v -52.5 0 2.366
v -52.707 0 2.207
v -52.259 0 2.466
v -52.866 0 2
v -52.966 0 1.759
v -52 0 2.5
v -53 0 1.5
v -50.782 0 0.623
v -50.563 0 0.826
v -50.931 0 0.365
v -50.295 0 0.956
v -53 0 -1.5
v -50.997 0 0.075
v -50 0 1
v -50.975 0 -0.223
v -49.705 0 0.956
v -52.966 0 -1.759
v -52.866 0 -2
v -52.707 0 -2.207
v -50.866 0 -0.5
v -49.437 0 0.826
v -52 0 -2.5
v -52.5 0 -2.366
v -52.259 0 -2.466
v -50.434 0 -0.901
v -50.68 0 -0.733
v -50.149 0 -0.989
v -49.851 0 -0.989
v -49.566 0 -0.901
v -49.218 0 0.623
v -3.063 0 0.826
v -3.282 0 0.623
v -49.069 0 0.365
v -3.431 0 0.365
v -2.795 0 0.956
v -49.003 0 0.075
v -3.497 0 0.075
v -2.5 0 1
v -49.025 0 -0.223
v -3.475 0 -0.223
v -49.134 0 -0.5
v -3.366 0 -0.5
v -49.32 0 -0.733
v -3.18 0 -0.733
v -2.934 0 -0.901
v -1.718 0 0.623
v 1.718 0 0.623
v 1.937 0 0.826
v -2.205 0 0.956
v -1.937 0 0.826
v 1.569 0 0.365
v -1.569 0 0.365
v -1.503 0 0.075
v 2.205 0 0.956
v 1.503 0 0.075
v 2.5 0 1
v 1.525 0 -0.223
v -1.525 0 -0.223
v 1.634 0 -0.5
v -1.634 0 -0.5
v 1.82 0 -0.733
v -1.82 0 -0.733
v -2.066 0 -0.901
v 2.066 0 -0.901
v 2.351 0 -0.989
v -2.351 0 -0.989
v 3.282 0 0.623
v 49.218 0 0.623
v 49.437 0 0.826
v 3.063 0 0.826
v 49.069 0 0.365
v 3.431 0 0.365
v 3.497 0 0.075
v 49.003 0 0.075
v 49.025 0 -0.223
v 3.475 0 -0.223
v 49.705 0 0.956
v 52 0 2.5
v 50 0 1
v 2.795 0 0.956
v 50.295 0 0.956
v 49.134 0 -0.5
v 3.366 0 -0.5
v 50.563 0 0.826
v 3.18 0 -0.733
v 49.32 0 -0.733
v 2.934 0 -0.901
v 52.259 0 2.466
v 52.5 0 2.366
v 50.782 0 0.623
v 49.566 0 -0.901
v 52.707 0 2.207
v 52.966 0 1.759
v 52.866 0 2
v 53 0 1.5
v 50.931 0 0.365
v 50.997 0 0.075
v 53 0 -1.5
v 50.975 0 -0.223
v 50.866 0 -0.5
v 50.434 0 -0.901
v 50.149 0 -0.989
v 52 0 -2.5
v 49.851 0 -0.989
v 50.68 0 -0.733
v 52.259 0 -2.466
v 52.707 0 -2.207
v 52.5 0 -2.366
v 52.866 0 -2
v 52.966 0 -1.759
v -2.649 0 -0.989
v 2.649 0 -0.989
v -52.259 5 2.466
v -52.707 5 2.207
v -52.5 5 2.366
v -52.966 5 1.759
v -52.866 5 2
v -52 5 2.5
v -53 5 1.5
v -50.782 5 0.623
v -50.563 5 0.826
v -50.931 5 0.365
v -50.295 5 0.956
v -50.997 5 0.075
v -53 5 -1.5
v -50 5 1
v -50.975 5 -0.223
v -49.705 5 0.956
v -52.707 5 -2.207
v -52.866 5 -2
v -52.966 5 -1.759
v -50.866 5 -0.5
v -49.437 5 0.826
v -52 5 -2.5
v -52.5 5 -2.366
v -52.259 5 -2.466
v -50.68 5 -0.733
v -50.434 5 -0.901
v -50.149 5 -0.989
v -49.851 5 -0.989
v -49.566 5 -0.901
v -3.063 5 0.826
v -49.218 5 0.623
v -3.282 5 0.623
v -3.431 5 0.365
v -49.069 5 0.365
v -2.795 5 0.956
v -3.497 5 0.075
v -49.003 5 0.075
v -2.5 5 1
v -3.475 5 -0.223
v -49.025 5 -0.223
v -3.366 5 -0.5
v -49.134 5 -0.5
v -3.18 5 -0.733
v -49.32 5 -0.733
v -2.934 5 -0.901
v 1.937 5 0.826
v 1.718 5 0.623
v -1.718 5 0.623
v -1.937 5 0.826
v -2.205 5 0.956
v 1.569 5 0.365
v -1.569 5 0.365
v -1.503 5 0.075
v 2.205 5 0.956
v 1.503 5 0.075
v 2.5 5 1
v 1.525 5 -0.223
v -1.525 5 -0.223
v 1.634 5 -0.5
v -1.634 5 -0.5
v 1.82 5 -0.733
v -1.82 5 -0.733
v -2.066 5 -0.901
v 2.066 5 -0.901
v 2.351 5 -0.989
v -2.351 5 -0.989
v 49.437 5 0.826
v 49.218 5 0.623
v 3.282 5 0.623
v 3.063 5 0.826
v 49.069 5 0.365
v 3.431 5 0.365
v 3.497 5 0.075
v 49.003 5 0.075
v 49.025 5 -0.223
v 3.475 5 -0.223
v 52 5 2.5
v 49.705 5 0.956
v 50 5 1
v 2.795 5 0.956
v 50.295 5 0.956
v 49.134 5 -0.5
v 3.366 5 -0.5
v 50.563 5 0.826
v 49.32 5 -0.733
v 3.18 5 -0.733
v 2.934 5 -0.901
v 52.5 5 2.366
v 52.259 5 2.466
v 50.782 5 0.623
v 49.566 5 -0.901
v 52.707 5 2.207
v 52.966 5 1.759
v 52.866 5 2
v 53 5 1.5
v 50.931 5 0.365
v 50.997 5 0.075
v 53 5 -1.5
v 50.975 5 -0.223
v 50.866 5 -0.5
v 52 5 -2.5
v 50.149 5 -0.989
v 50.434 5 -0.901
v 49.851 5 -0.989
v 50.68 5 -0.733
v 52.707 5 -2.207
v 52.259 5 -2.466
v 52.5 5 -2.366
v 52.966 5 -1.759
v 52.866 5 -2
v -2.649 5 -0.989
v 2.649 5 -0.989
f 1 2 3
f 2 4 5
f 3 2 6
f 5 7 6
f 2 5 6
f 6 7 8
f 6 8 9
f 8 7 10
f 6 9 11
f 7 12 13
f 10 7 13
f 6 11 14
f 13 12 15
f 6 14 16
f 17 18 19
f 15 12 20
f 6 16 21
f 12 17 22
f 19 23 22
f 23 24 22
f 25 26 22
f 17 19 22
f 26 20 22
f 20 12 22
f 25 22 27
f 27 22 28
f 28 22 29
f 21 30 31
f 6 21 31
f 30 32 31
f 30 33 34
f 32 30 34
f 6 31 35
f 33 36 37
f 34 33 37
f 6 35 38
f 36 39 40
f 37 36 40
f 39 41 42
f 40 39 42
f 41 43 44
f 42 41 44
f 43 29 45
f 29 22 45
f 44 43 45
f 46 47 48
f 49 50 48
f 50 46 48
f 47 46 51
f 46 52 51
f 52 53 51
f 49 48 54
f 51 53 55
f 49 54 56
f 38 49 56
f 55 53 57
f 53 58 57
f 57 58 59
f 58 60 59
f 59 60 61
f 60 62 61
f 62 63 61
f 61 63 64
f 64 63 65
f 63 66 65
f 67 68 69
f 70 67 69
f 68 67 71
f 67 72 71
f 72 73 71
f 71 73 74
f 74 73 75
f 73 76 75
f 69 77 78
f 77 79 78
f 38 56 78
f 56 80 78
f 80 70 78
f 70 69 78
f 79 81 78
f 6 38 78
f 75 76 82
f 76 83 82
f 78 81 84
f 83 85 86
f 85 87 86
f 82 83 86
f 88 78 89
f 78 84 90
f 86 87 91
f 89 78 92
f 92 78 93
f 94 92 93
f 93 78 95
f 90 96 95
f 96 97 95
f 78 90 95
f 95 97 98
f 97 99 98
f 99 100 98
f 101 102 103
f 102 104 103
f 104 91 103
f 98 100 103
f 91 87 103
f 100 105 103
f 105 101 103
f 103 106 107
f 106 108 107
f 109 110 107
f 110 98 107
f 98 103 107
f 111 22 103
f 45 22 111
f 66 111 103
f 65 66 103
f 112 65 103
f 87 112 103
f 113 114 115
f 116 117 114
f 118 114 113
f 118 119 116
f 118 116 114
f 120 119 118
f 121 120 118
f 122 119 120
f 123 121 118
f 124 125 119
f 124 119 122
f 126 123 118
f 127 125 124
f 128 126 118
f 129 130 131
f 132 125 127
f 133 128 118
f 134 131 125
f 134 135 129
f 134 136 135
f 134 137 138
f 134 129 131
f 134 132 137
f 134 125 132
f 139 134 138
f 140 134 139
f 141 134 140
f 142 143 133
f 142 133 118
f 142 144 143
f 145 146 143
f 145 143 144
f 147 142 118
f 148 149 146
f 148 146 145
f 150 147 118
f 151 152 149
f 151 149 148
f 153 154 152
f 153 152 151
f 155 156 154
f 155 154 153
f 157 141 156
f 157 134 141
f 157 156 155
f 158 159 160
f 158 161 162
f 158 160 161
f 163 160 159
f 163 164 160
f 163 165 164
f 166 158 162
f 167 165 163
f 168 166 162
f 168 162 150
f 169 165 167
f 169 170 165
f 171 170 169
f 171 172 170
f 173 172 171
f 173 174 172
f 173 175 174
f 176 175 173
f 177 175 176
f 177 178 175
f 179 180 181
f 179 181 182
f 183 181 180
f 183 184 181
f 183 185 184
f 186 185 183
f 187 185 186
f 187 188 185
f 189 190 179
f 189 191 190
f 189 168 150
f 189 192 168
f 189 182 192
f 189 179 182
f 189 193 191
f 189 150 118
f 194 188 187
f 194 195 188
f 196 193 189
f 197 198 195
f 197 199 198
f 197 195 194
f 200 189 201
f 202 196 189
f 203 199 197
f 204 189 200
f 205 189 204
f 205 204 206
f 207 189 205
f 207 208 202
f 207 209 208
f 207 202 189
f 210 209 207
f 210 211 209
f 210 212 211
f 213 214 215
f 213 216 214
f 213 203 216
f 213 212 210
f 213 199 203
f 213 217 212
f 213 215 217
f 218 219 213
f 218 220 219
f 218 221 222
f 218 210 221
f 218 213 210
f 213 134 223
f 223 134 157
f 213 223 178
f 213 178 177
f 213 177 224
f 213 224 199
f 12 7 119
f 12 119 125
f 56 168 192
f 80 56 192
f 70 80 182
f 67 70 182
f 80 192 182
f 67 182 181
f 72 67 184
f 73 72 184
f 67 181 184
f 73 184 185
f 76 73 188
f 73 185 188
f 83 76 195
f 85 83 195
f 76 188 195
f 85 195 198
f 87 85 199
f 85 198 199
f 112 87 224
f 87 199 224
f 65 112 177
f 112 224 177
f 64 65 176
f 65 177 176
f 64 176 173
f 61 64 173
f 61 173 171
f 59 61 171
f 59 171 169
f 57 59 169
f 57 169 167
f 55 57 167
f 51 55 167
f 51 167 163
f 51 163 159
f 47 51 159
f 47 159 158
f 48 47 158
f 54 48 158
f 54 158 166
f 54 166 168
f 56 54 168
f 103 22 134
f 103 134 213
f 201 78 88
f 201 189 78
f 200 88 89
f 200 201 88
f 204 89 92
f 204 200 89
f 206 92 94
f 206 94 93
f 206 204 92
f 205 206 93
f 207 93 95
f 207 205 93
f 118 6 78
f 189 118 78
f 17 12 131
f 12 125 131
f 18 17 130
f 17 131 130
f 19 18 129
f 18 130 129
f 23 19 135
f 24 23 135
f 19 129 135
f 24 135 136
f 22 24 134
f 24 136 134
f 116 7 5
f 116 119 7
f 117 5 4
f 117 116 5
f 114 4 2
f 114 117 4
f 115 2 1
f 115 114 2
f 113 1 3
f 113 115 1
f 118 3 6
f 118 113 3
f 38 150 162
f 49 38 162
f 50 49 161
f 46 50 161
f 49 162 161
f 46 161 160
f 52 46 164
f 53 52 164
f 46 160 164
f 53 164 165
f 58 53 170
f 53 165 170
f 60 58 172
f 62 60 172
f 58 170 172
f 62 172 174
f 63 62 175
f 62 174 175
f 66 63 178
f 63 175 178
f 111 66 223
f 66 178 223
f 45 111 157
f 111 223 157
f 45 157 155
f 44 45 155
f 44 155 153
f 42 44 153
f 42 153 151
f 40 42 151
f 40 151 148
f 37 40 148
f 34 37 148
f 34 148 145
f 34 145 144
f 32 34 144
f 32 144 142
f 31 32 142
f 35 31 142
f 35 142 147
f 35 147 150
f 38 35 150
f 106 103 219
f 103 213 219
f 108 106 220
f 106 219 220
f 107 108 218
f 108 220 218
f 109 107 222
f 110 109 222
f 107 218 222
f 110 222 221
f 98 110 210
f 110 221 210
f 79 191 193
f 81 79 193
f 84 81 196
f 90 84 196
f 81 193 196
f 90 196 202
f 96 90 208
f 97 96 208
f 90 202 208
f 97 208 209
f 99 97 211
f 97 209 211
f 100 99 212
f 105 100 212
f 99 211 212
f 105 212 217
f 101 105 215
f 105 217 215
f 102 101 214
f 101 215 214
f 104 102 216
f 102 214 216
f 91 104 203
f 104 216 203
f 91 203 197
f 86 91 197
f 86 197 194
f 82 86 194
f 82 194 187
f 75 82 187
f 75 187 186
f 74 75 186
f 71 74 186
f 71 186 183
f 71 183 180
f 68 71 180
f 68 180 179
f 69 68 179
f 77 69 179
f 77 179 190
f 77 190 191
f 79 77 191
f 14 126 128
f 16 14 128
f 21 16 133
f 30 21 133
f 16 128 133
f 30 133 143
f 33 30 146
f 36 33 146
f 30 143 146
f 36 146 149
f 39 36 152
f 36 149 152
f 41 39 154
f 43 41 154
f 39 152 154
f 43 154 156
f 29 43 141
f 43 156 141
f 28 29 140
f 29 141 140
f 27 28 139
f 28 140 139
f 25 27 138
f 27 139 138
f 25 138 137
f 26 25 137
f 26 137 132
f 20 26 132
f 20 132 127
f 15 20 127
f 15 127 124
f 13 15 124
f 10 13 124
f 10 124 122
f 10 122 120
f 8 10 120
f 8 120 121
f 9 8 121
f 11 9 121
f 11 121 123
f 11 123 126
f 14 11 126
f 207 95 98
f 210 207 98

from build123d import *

# Parameters (mm, degrees)
SKETCH1_W           = 106
SKETCH1_H           = 5
BOSS_EXTRUDE1_DEPTH = 5
FILLET1_R           = 1
FILLET2_R           = 1
SKETCH2_R           = 1
CUT_EXTRUDE1_DEPTH  = 54.293995909


with BuildPart() as part:
    # Sketch1 → Boss-Extrude1 (new body)
    with BuildSketch(Plane(origin=(0, 0, 0), x_dir=(1, 0, 0), z_dir=(0, 1, 0))):
        Rectangle(SKETCH1_W, SKETCH1_H)
    extrude(amount=BOSS_EXTRUDE1_DEPTH)

    # Fillet1
    fillet1_edges = [part.edges().sort_by_distance(p)[0] for p in [
        (-53, 2.5, 2.5),
        (-53, 2.5, -2.5),
    ]]
    fillet(fillet1_edges, radius=FILLET1_R)

    # Fillet2
    fillet2_edges = [part.edges().sort_by_distance(p)[0] for p in [
        (53, 2.5, 2.5),
        (53, 2.5, -2.5),
    ]]
    fillet(fillet2_edges, radius=FILLET2_R)

    # Sketch2 → Cut-Extrude1 (cut, through all)
    with BuildSketch(Plane(origin=(0, 5, 0), x_dir=(1, 0, 0), z_dir=(0, 1, 0))):
        with Locations(Location((-50, 0, 0), (0, 0, 270))):
            Circle(SKETCH2_R)
        with Locations(Location((50, 0, 0), (0, 0, 270))):
            Circle(SKETCH2_R)
        with Locations(Location((-2.5, 0, 0), (0, 0, 270))):
            Circle(SKETCH2_R)
        with Locations(Location((2.5, 0, 0), (0, 0, 270))):
            Circle(SKETCH2_R)
    extrude(amount=-CUT_EXTRUDE1_DEPTH, mode=Mode.SUBTRACT)


solid = part.part
